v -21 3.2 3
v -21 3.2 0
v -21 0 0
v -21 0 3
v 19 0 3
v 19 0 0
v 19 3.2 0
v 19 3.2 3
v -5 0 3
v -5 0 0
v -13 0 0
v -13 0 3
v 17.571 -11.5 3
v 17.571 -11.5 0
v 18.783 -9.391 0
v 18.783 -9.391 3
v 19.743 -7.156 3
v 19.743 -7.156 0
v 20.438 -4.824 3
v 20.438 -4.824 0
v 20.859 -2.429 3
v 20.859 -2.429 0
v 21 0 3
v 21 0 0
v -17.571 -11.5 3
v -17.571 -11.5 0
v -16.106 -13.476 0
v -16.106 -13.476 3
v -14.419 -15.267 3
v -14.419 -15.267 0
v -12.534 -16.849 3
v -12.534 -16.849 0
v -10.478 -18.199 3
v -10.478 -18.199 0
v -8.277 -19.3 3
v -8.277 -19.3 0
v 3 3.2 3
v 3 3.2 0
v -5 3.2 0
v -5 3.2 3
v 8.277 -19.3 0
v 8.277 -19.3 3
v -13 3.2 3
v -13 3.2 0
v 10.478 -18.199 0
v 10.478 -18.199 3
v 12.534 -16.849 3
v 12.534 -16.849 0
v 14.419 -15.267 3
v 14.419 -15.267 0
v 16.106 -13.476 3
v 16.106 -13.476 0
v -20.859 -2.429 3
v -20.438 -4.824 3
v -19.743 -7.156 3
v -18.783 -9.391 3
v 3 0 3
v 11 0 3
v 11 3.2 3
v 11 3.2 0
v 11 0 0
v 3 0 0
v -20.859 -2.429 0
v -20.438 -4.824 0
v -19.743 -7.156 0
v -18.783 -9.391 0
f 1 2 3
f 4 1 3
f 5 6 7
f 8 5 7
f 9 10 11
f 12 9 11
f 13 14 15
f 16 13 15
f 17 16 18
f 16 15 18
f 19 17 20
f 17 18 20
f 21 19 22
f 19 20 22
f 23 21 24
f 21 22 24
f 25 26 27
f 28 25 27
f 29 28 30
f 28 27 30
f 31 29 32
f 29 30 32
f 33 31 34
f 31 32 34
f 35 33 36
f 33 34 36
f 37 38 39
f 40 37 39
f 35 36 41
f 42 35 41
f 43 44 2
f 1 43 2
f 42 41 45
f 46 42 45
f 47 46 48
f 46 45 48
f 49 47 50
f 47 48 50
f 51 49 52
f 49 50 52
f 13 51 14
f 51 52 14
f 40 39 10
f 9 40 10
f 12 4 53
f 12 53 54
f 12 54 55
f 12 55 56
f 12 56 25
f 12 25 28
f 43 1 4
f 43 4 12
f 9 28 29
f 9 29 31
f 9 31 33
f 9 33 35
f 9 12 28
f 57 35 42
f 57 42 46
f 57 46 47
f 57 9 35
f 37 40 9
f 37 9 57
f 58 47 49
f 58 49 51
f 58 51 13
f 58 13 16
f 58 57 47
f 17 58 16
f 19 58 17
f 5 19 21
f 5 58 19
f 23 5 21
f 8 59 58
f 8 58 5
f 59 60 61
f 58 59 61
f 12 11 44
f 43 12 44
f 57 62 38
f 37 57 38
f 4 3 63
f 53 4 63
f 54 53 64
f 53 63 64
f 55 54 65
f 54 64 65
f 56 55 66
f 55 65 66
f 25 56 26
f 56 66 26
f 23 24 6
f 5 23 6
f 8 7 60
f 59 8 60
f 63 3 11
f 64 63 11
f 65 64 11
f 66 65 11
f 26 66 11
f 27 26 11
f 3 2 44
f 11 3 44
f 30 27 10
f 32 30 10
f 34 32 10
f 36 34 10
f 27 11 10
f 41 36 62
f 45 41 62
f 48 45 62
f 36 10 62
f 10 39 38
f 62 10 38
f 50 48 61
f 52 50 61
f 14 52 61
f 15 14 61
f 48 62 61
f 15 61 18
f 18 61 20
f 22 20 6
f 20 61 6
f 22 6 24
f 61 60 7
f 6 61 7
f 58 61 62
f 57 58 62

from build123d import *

# Parameters (mm, degrees)
F1_DEPTH = 3


with BuildPart() as f1:
    # F0 (on Top) → F1 (new body)
    with BuildSketch(Plane.XY):
        with BuildLine():
            Line((-21, 3.2), (-21, 0))
            ThreePointArc((-21, 0), (-20.124574, -6.000127), (-17.571283, -11.5))
            ThreePointArc((-17.571283, -11.5), (-13.499794, -16.085881), (-8.277077, -19.3))
            Line((-8.277077, -19.3), (8.277077, -19.3))
            ThreePointArc((8.277077, -19.3), (13.499794, -16.085881), (17.571283, -11.5))
            ThreePointArc((17.571283, -11.5), (20.124574, -6.000127), (21, 0))
            Line((21, 0), (19, 0))
            Line((19, 0), (19, 3.2))
            Line((19, 3.2), (11, 3.2))
            Line((11, 3.2), (11, 0))
            Line((11, 0), (3, 0))
            Line((3, 0), (3, 3.2))
            Line((3, 3.2), (-5, 3.2))
            Line((-5, 3.2), (-5, 0))
            Line((-5, 0), (-13, 0))
            Line((-13, 0), (-13, 3.2))
            Line((-13, 3.2), (-21, 3.2))
        make_face()
    extrude(amount=F1_DEPTH)


solid = f1.part
